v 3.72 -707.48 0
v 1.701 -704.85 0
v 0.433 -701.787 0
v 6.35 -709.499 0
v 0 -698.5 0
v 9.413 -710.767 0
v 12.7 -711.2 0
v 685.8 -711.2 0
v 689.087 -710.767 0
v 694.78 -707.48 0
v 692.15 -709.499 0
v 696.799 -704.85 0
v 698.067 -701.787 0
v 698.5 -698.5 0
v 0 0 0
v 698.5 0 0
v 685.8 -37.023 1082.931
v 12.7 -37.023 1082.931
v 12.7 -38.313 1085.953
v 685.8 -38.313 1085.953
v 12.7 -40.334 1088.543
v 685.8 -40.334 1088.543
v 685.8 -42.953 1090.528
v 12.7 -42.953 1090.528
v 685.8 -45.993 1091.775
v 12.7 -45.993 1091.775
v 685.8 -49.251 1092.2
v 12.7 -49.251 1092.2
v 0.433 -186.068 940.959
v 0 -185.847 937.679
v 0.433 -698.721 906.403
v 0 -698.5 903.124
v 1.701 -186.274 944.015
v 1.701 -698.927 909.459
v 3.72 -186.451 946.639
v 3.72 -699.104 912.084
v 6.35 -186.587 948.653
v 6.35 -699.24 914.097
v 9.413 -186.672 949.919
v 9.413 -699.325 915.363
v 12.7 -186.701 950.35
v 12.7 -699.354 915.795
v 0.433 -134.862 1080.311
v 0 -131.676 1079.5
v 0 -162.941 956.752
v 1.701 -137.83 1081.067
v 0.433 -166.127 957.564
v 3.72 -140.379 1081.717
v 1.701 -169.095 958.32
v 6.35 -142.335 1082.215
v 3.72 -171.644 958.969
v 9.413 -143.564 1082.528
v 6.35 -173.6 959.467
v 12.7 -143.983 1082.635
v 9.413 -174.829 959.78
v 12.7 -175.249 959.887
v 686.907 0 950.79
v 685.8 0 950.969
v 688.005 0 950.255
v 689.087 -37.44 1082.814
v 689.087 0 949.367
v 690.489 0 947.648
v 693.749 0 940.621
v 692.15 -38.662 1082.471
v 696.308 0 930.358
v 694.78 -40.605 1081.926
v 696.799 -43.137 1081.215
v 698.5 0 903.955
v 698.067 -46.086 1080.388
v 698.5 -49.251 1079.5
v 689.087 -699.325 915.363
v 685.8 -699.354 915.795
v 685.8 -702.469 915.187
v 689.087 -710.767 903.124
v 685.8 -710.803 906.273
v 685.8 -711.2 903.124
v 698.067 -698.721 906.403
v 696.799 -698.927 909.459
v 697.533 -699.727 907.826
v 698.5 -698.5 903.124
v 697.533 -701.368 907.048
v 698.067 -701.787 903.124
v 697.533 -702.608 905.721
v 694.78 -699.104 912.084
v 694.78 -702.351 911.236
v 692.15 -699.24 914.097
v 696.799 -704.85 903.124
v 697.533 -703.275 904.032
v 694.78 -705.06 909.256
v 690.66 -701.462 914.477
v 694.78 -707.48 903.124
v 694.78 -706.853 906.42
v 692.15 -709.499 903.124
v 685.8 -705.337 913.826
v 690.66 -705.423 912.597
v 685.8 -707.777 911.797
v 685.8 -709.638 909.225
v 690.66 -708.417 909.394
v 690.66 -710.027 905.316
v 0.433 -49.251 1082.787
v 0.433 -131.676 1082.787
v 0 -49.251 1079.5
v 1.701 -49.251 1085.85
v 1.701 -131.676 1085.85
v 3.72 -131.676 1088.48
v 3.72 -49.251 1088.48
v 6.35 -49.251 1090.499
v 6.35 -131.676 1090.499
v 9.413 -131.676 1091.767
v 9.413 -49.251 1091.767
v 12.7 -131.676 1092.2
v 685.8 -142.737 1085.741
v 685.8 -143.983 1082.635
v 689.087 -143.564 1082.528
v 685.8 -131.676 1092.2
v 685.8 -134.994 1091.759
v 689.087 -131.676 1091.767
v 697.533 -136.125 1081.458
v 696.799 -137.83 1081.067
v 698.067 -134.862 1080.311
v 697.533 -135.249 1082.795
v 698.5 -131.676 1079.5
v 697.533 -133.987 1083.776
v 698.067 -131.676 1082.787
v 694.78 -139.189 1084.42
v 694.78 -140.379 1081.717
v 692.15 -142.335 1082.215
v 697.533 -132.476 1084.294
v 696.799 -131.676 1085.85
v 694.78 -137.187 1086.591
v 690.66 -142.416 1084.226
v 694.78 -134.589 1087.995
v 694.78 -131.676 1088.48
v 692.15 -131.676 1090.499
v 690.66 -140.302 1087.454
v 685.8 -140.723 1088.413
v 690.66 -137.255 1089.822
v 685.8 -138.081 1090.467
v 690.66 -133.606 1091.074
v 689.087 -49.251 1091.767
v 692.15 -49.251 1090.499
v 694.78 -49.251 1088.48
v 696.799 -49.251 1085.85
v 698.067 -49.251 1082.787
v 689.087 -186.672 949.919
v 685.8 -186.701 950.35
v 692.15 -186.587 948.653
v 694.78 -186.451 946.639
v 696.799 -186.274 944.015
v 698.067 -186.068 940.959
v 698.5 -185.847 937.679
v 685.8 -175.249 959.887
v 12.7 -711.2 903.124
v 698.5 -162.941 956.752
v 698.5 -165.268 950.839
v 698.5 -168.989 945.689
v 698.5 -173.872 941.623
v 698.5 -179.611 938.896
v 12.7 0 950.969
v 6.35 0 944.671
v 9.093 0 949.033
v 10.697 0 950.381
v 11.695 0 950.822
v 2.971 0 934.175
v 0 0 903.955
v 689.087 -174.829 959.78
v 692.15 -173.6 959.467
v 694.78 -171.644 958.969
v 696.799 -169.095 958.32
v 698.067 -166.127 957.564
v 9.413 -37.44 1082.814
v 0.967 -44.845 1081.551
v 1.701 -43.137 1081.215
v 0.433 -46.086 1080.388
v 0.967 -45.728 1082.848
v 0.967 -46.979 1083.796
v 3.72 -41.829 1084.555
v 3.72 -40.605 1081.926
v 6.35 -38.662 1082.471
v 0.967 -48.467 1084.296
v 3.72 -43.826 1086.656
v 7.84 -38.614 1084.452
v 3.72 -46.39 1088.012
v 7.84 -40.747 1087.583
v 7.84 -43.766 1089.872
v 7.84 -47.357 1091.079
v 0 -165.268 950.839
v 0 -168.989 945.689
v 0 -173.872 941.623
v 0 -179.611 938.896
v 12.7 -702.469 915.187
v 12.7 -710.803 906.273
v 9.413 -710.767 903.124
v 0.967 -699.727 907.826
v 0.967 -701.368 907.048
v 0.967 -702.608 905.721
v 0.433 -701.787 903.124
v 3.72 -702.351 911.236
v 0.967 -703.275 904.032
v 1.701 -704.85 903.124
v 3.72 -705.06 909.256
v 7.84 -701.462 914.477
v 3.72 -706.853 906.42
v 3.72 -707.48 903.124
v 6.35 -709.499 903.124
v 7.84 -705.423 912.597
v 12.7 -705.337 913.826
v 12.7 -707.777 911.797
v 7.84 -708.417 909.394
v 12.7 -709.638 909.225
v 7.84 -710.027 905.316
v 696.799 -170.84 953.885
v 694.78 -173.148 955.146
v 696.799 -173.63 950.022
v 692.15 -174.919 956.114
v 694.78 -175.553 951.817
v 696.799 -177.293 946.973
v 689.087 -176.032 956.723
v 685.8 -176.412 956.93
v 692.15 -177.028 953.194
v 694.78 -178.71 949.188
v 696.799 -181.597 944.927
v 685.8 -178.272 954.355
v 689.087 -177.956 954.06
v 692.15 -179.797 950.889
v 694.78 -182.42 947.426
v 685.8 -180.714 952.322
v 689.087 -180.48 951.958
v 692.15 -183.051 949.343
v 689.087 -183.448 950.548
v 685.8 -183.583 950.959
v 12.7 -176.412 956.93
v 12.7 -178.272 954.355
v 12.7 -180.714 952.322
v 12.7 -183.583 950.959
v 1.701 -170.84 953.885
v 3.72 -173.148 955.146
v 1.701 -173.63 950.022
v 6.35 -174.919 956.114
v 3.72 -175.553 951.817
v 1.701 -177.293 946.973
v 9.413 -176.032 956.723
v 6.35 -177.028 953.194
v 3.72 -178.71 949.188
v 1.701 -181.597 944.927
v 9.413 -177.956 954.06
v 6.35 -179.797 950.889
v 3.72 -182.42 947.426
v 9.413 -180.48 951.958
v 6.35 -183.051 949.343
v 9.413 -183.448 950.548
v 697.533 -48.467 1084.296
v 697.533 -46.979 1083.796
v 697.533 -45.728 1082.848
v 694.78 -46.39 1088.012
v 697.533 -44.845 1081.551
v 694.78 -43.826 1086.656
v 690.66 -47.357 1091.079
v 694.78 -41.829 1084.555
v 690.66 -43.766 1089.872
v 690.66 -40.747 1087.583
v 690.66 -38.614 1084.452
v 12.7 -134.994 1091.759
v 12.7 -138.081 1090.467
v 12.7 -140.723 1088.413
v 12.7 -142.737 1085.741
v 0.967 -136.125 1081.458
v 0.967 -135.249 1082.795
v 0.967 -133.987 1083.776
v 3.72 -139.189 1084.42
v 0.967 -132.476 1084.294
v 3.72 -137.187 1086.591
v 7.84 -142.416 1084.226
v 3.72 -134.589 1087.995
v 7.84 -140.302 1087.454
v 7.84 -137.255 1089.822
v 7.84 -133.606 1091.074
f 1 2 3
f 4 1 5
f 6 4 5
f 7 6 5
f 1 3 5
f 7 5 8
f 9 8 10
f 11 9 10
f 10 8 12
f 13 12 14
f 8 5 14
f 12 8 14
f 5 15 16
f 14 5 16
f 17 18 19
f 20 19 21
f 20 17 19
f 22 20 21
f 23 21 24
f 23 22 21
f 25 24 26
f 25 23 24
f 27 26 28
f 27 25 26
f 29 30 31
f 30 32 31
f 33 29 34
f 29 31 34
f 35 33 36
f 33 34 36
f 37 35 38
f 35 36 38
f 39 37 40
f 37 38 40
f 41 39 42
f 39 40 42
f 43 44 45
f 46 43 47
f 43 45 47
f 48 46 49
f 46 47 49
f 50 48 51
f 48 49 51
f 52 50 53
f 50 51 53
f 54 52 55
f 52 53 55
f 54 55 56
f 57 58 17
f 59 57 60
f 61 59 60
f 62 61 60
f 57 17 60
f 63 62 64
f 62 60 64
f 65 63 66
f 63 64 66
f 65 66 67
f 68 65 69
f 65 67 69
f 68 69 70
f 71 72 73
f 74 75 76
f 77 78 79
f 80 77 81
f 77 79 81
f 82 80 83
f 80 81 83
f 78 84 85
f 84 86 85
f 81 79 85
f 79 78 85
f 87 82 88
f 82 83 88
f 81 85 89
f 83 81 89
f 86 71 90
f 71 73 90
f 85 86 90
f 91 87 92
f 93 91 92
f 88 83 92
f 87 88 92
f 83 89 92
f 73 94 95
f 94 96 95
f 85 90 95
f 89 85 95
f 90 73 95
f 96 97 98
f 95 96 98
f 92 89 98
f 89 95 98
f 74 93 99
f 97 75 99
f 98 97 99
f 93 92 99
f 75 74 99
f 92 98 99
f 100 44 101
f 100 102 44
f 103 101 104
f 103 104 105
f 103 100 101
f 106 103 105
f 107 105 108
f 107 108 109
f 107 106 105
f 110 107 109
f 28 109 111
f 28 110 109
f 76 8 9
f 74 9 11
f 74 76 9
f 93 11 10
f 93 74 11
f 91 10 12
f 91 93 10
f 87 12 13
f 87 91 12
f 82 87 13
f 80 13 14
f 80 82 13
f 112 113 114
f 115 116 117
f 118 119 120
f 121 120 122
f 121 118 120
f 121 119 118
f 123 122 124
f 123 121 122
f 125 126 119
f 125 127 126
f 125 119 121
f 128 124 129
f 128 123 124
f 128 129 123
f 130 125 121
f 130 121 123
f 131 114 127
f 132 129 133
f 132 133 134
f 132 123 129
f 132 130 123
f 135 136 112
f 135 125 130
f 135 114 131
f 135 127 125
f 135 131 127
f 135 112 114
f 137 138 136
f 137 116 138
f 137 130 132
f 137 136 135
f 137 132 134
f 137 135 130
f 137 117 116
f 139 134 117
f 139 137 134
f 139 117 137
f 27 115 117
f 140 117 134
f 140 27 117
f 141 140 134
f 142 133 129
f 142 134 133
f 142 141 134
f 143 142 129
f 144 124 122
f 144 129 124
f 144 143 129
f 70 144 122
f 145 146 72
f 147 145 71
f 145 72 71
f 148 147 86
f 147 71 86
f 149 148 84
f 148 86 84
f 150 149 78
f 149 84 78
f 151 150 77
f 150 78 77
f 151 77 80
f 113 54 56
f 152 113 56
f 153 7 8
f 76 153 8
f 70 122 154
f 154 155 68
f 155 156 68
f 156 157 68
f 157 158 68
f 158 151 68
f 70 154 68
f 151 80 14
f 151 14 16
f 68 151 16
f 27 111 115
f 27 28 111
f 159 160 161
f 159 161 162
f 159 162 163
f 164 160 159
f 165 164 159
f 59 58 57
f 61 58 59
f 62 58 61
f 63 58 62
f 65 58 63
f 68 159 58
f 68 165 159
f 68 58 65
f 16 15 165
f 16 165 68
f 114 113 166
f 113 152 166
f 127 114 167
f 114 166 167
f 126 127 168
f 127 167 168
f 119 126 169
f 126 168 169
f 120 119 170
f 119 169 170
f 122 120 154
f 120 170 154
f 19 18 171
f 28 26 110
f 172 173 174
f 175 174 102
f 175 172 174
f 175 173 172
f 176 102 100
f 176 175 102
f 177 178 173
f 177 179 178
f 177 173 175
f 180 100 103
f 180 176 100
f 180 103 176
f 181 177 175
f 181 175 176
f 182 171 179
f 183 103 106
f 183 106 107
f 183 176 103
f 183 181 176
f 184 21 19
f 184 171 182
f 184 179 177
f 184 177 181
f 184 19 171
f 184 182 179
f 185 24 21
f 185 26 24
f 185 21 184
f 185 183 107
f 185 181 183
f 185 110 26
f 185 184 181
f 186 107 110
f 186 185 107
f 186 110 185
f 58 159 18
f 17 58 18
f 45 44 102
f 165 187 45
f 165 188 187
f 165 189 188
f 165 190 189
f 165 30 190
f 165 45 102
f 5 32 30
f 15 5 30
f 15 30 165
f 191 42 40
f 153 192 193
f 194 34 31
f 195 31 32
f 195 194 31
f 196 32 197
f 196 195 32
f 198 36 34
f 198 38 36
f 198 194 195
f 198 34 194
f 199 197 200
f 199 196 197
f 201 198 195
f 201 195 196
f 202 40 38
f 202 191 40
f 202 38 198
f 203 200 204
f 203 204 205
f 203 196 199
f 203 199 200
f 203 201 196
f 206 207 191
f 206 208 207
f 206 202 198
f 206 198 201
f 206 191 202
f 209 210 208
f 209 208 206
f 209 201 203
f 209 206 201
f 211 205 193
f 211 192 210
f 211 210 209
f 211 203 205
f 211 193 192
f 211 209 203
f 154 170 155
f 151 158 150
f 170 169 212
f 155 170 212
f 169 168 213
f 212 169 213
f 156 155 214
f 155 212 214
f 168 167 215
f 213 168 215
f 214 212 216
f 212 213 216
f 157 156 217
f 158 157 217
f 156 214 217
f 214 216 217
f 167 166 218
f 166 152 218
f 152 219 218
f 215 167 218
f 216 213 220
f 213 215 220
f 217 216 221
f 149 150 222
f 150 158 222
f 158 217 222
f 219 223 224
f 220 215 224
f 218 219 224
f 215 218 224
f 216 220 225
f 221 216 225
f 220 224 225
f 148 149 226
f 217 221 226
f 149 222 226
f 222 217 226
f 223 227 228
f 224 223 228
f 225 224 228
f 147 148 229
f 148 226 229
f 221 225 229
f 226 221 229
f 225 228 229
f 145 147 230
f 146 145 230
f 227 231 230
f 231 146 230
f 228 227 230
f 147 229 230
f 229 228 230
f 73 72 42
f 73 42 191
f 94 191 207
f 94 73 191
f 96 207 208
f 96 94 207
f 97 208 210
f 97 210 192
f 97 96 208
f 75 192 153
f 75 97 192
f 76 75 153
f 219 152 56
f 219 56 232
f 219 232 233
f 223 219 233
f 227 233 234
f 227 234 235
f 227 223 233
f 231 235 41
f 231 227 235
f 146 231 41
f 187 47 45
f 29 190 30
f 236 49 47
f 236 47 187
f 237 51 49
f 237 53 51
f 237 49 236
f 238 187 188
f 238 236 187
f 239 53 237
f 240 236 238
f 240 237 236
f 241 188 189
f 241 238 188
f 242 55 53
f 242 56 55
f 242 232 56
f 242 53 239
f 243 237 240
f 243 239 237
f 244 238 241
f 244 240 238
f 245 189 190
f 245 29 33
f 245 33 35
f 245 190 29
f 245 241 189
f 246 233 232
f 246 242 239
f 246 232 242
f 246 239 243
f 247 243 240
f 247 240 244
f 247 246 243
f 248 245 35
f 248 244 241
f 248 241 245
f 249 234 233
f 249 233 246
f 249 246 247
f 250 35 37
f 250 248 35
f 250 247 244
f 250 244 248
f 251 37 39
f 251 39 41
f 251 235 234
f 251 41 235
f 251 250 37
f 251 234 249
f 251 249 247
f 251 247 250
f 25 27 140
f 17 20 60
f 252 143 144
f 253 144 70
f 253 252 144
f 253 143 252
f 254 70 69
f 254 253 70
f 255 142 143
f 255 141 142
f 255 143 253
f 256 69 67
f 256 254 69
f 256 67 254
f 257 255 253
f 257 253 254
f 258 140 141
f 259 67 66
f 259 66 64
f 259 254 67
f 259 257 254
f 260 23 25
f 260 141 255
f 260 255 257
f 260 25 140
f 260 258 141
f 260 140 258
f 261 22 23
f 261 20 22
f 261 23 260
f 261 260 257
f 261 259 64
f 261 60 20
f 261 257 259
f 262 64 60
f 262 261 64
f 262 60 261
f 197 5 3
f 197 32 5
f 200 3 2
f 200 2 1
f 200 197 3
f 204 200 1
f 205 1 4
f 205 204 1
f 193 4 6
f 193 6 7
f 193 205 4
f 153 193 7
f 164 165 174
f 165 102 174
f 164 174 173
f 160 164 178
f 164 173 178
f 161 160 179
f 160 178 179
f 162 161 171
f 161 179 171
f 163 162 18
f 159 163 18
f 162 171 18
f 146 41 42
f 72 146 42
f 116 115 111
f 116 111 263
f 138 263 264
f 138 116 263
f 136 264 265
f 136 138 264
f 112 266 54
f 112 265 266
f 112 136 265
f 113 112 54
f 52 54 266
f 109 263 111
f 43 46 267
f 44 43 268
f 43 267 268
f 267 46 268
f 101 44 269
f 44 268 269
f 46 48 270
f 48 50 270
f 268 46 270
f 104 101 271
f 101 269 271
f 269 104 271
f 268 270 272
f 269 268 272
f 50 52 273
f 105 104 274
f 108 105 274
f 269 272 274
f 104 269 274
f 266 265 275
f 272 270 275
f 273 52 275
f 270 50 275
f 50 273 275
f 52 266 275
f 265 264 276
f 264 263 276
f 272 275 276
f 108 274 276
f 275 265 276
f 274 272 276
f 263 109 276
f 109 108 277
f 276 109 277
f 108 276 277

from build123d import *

# Parameters (mm, degrees)
F0_W     = 698.5
F0_H     = 711.2
F1_DEPTH = 1092.2
F3_DEPTH = 698.501
F4_R     = 12.7


with BuildPart() as f1:
    # F0 (on Top) → F1 (new body)
    with BuildSketch(Plane.XY):
        with Locations((349.25, -355.6)):
            Rectangle(F0_W, F0_H)
    extrude(amount=F1_DEPTH)

    # F2 (on face) → F3 (cut, through all)
    with BuildSketch(Plane(origin=(0, 0, 0), x_dir=(0, -1, 0), z_dir=(-1, 0, 0))):
        Polygon((711.2, 1092.2), (141.5470689535, 1092.2), (177.5199323893, 950.9692788124), (711.2, 914.996445179), align=None)
        Polygon((0, 1092.2), (0, 950.9692788124), (39.6239757538, 1092.2), align=None)
    extrude(amount=-F3_DEPTH, mode=Mode.SUBTRACT)

    # F4
    f4_edges = [f1.edges().sort_by_distance(p)[0] for p in [
        (0, -711.2, 457.498223),
        (698.5, -711.2, 457.498223),
        (349.25, -711.2, 914.996445),
        (0, -444.359966, 932.982862),
        (698.5, -444.359966, 932.982862),
        (349.25, -177.519932, 950.969279),
        (349.25, -141.547069, 1092.2),
        (349.25, -39.623976, 1092.2),
        (0, -159.533501, 1021.584639),
        (698.5, -159.533501, 1021.584639),
        (0, -19.811988, 1021.584639),
        (698.5, -90.585522, 1092.2),
        (698.5, -19.811988, 1021.584639),
        (0, -90.585522, 1092.2),
    ]]
    fillet(f4_edges, radius=F4_R)


solid = f1.part
